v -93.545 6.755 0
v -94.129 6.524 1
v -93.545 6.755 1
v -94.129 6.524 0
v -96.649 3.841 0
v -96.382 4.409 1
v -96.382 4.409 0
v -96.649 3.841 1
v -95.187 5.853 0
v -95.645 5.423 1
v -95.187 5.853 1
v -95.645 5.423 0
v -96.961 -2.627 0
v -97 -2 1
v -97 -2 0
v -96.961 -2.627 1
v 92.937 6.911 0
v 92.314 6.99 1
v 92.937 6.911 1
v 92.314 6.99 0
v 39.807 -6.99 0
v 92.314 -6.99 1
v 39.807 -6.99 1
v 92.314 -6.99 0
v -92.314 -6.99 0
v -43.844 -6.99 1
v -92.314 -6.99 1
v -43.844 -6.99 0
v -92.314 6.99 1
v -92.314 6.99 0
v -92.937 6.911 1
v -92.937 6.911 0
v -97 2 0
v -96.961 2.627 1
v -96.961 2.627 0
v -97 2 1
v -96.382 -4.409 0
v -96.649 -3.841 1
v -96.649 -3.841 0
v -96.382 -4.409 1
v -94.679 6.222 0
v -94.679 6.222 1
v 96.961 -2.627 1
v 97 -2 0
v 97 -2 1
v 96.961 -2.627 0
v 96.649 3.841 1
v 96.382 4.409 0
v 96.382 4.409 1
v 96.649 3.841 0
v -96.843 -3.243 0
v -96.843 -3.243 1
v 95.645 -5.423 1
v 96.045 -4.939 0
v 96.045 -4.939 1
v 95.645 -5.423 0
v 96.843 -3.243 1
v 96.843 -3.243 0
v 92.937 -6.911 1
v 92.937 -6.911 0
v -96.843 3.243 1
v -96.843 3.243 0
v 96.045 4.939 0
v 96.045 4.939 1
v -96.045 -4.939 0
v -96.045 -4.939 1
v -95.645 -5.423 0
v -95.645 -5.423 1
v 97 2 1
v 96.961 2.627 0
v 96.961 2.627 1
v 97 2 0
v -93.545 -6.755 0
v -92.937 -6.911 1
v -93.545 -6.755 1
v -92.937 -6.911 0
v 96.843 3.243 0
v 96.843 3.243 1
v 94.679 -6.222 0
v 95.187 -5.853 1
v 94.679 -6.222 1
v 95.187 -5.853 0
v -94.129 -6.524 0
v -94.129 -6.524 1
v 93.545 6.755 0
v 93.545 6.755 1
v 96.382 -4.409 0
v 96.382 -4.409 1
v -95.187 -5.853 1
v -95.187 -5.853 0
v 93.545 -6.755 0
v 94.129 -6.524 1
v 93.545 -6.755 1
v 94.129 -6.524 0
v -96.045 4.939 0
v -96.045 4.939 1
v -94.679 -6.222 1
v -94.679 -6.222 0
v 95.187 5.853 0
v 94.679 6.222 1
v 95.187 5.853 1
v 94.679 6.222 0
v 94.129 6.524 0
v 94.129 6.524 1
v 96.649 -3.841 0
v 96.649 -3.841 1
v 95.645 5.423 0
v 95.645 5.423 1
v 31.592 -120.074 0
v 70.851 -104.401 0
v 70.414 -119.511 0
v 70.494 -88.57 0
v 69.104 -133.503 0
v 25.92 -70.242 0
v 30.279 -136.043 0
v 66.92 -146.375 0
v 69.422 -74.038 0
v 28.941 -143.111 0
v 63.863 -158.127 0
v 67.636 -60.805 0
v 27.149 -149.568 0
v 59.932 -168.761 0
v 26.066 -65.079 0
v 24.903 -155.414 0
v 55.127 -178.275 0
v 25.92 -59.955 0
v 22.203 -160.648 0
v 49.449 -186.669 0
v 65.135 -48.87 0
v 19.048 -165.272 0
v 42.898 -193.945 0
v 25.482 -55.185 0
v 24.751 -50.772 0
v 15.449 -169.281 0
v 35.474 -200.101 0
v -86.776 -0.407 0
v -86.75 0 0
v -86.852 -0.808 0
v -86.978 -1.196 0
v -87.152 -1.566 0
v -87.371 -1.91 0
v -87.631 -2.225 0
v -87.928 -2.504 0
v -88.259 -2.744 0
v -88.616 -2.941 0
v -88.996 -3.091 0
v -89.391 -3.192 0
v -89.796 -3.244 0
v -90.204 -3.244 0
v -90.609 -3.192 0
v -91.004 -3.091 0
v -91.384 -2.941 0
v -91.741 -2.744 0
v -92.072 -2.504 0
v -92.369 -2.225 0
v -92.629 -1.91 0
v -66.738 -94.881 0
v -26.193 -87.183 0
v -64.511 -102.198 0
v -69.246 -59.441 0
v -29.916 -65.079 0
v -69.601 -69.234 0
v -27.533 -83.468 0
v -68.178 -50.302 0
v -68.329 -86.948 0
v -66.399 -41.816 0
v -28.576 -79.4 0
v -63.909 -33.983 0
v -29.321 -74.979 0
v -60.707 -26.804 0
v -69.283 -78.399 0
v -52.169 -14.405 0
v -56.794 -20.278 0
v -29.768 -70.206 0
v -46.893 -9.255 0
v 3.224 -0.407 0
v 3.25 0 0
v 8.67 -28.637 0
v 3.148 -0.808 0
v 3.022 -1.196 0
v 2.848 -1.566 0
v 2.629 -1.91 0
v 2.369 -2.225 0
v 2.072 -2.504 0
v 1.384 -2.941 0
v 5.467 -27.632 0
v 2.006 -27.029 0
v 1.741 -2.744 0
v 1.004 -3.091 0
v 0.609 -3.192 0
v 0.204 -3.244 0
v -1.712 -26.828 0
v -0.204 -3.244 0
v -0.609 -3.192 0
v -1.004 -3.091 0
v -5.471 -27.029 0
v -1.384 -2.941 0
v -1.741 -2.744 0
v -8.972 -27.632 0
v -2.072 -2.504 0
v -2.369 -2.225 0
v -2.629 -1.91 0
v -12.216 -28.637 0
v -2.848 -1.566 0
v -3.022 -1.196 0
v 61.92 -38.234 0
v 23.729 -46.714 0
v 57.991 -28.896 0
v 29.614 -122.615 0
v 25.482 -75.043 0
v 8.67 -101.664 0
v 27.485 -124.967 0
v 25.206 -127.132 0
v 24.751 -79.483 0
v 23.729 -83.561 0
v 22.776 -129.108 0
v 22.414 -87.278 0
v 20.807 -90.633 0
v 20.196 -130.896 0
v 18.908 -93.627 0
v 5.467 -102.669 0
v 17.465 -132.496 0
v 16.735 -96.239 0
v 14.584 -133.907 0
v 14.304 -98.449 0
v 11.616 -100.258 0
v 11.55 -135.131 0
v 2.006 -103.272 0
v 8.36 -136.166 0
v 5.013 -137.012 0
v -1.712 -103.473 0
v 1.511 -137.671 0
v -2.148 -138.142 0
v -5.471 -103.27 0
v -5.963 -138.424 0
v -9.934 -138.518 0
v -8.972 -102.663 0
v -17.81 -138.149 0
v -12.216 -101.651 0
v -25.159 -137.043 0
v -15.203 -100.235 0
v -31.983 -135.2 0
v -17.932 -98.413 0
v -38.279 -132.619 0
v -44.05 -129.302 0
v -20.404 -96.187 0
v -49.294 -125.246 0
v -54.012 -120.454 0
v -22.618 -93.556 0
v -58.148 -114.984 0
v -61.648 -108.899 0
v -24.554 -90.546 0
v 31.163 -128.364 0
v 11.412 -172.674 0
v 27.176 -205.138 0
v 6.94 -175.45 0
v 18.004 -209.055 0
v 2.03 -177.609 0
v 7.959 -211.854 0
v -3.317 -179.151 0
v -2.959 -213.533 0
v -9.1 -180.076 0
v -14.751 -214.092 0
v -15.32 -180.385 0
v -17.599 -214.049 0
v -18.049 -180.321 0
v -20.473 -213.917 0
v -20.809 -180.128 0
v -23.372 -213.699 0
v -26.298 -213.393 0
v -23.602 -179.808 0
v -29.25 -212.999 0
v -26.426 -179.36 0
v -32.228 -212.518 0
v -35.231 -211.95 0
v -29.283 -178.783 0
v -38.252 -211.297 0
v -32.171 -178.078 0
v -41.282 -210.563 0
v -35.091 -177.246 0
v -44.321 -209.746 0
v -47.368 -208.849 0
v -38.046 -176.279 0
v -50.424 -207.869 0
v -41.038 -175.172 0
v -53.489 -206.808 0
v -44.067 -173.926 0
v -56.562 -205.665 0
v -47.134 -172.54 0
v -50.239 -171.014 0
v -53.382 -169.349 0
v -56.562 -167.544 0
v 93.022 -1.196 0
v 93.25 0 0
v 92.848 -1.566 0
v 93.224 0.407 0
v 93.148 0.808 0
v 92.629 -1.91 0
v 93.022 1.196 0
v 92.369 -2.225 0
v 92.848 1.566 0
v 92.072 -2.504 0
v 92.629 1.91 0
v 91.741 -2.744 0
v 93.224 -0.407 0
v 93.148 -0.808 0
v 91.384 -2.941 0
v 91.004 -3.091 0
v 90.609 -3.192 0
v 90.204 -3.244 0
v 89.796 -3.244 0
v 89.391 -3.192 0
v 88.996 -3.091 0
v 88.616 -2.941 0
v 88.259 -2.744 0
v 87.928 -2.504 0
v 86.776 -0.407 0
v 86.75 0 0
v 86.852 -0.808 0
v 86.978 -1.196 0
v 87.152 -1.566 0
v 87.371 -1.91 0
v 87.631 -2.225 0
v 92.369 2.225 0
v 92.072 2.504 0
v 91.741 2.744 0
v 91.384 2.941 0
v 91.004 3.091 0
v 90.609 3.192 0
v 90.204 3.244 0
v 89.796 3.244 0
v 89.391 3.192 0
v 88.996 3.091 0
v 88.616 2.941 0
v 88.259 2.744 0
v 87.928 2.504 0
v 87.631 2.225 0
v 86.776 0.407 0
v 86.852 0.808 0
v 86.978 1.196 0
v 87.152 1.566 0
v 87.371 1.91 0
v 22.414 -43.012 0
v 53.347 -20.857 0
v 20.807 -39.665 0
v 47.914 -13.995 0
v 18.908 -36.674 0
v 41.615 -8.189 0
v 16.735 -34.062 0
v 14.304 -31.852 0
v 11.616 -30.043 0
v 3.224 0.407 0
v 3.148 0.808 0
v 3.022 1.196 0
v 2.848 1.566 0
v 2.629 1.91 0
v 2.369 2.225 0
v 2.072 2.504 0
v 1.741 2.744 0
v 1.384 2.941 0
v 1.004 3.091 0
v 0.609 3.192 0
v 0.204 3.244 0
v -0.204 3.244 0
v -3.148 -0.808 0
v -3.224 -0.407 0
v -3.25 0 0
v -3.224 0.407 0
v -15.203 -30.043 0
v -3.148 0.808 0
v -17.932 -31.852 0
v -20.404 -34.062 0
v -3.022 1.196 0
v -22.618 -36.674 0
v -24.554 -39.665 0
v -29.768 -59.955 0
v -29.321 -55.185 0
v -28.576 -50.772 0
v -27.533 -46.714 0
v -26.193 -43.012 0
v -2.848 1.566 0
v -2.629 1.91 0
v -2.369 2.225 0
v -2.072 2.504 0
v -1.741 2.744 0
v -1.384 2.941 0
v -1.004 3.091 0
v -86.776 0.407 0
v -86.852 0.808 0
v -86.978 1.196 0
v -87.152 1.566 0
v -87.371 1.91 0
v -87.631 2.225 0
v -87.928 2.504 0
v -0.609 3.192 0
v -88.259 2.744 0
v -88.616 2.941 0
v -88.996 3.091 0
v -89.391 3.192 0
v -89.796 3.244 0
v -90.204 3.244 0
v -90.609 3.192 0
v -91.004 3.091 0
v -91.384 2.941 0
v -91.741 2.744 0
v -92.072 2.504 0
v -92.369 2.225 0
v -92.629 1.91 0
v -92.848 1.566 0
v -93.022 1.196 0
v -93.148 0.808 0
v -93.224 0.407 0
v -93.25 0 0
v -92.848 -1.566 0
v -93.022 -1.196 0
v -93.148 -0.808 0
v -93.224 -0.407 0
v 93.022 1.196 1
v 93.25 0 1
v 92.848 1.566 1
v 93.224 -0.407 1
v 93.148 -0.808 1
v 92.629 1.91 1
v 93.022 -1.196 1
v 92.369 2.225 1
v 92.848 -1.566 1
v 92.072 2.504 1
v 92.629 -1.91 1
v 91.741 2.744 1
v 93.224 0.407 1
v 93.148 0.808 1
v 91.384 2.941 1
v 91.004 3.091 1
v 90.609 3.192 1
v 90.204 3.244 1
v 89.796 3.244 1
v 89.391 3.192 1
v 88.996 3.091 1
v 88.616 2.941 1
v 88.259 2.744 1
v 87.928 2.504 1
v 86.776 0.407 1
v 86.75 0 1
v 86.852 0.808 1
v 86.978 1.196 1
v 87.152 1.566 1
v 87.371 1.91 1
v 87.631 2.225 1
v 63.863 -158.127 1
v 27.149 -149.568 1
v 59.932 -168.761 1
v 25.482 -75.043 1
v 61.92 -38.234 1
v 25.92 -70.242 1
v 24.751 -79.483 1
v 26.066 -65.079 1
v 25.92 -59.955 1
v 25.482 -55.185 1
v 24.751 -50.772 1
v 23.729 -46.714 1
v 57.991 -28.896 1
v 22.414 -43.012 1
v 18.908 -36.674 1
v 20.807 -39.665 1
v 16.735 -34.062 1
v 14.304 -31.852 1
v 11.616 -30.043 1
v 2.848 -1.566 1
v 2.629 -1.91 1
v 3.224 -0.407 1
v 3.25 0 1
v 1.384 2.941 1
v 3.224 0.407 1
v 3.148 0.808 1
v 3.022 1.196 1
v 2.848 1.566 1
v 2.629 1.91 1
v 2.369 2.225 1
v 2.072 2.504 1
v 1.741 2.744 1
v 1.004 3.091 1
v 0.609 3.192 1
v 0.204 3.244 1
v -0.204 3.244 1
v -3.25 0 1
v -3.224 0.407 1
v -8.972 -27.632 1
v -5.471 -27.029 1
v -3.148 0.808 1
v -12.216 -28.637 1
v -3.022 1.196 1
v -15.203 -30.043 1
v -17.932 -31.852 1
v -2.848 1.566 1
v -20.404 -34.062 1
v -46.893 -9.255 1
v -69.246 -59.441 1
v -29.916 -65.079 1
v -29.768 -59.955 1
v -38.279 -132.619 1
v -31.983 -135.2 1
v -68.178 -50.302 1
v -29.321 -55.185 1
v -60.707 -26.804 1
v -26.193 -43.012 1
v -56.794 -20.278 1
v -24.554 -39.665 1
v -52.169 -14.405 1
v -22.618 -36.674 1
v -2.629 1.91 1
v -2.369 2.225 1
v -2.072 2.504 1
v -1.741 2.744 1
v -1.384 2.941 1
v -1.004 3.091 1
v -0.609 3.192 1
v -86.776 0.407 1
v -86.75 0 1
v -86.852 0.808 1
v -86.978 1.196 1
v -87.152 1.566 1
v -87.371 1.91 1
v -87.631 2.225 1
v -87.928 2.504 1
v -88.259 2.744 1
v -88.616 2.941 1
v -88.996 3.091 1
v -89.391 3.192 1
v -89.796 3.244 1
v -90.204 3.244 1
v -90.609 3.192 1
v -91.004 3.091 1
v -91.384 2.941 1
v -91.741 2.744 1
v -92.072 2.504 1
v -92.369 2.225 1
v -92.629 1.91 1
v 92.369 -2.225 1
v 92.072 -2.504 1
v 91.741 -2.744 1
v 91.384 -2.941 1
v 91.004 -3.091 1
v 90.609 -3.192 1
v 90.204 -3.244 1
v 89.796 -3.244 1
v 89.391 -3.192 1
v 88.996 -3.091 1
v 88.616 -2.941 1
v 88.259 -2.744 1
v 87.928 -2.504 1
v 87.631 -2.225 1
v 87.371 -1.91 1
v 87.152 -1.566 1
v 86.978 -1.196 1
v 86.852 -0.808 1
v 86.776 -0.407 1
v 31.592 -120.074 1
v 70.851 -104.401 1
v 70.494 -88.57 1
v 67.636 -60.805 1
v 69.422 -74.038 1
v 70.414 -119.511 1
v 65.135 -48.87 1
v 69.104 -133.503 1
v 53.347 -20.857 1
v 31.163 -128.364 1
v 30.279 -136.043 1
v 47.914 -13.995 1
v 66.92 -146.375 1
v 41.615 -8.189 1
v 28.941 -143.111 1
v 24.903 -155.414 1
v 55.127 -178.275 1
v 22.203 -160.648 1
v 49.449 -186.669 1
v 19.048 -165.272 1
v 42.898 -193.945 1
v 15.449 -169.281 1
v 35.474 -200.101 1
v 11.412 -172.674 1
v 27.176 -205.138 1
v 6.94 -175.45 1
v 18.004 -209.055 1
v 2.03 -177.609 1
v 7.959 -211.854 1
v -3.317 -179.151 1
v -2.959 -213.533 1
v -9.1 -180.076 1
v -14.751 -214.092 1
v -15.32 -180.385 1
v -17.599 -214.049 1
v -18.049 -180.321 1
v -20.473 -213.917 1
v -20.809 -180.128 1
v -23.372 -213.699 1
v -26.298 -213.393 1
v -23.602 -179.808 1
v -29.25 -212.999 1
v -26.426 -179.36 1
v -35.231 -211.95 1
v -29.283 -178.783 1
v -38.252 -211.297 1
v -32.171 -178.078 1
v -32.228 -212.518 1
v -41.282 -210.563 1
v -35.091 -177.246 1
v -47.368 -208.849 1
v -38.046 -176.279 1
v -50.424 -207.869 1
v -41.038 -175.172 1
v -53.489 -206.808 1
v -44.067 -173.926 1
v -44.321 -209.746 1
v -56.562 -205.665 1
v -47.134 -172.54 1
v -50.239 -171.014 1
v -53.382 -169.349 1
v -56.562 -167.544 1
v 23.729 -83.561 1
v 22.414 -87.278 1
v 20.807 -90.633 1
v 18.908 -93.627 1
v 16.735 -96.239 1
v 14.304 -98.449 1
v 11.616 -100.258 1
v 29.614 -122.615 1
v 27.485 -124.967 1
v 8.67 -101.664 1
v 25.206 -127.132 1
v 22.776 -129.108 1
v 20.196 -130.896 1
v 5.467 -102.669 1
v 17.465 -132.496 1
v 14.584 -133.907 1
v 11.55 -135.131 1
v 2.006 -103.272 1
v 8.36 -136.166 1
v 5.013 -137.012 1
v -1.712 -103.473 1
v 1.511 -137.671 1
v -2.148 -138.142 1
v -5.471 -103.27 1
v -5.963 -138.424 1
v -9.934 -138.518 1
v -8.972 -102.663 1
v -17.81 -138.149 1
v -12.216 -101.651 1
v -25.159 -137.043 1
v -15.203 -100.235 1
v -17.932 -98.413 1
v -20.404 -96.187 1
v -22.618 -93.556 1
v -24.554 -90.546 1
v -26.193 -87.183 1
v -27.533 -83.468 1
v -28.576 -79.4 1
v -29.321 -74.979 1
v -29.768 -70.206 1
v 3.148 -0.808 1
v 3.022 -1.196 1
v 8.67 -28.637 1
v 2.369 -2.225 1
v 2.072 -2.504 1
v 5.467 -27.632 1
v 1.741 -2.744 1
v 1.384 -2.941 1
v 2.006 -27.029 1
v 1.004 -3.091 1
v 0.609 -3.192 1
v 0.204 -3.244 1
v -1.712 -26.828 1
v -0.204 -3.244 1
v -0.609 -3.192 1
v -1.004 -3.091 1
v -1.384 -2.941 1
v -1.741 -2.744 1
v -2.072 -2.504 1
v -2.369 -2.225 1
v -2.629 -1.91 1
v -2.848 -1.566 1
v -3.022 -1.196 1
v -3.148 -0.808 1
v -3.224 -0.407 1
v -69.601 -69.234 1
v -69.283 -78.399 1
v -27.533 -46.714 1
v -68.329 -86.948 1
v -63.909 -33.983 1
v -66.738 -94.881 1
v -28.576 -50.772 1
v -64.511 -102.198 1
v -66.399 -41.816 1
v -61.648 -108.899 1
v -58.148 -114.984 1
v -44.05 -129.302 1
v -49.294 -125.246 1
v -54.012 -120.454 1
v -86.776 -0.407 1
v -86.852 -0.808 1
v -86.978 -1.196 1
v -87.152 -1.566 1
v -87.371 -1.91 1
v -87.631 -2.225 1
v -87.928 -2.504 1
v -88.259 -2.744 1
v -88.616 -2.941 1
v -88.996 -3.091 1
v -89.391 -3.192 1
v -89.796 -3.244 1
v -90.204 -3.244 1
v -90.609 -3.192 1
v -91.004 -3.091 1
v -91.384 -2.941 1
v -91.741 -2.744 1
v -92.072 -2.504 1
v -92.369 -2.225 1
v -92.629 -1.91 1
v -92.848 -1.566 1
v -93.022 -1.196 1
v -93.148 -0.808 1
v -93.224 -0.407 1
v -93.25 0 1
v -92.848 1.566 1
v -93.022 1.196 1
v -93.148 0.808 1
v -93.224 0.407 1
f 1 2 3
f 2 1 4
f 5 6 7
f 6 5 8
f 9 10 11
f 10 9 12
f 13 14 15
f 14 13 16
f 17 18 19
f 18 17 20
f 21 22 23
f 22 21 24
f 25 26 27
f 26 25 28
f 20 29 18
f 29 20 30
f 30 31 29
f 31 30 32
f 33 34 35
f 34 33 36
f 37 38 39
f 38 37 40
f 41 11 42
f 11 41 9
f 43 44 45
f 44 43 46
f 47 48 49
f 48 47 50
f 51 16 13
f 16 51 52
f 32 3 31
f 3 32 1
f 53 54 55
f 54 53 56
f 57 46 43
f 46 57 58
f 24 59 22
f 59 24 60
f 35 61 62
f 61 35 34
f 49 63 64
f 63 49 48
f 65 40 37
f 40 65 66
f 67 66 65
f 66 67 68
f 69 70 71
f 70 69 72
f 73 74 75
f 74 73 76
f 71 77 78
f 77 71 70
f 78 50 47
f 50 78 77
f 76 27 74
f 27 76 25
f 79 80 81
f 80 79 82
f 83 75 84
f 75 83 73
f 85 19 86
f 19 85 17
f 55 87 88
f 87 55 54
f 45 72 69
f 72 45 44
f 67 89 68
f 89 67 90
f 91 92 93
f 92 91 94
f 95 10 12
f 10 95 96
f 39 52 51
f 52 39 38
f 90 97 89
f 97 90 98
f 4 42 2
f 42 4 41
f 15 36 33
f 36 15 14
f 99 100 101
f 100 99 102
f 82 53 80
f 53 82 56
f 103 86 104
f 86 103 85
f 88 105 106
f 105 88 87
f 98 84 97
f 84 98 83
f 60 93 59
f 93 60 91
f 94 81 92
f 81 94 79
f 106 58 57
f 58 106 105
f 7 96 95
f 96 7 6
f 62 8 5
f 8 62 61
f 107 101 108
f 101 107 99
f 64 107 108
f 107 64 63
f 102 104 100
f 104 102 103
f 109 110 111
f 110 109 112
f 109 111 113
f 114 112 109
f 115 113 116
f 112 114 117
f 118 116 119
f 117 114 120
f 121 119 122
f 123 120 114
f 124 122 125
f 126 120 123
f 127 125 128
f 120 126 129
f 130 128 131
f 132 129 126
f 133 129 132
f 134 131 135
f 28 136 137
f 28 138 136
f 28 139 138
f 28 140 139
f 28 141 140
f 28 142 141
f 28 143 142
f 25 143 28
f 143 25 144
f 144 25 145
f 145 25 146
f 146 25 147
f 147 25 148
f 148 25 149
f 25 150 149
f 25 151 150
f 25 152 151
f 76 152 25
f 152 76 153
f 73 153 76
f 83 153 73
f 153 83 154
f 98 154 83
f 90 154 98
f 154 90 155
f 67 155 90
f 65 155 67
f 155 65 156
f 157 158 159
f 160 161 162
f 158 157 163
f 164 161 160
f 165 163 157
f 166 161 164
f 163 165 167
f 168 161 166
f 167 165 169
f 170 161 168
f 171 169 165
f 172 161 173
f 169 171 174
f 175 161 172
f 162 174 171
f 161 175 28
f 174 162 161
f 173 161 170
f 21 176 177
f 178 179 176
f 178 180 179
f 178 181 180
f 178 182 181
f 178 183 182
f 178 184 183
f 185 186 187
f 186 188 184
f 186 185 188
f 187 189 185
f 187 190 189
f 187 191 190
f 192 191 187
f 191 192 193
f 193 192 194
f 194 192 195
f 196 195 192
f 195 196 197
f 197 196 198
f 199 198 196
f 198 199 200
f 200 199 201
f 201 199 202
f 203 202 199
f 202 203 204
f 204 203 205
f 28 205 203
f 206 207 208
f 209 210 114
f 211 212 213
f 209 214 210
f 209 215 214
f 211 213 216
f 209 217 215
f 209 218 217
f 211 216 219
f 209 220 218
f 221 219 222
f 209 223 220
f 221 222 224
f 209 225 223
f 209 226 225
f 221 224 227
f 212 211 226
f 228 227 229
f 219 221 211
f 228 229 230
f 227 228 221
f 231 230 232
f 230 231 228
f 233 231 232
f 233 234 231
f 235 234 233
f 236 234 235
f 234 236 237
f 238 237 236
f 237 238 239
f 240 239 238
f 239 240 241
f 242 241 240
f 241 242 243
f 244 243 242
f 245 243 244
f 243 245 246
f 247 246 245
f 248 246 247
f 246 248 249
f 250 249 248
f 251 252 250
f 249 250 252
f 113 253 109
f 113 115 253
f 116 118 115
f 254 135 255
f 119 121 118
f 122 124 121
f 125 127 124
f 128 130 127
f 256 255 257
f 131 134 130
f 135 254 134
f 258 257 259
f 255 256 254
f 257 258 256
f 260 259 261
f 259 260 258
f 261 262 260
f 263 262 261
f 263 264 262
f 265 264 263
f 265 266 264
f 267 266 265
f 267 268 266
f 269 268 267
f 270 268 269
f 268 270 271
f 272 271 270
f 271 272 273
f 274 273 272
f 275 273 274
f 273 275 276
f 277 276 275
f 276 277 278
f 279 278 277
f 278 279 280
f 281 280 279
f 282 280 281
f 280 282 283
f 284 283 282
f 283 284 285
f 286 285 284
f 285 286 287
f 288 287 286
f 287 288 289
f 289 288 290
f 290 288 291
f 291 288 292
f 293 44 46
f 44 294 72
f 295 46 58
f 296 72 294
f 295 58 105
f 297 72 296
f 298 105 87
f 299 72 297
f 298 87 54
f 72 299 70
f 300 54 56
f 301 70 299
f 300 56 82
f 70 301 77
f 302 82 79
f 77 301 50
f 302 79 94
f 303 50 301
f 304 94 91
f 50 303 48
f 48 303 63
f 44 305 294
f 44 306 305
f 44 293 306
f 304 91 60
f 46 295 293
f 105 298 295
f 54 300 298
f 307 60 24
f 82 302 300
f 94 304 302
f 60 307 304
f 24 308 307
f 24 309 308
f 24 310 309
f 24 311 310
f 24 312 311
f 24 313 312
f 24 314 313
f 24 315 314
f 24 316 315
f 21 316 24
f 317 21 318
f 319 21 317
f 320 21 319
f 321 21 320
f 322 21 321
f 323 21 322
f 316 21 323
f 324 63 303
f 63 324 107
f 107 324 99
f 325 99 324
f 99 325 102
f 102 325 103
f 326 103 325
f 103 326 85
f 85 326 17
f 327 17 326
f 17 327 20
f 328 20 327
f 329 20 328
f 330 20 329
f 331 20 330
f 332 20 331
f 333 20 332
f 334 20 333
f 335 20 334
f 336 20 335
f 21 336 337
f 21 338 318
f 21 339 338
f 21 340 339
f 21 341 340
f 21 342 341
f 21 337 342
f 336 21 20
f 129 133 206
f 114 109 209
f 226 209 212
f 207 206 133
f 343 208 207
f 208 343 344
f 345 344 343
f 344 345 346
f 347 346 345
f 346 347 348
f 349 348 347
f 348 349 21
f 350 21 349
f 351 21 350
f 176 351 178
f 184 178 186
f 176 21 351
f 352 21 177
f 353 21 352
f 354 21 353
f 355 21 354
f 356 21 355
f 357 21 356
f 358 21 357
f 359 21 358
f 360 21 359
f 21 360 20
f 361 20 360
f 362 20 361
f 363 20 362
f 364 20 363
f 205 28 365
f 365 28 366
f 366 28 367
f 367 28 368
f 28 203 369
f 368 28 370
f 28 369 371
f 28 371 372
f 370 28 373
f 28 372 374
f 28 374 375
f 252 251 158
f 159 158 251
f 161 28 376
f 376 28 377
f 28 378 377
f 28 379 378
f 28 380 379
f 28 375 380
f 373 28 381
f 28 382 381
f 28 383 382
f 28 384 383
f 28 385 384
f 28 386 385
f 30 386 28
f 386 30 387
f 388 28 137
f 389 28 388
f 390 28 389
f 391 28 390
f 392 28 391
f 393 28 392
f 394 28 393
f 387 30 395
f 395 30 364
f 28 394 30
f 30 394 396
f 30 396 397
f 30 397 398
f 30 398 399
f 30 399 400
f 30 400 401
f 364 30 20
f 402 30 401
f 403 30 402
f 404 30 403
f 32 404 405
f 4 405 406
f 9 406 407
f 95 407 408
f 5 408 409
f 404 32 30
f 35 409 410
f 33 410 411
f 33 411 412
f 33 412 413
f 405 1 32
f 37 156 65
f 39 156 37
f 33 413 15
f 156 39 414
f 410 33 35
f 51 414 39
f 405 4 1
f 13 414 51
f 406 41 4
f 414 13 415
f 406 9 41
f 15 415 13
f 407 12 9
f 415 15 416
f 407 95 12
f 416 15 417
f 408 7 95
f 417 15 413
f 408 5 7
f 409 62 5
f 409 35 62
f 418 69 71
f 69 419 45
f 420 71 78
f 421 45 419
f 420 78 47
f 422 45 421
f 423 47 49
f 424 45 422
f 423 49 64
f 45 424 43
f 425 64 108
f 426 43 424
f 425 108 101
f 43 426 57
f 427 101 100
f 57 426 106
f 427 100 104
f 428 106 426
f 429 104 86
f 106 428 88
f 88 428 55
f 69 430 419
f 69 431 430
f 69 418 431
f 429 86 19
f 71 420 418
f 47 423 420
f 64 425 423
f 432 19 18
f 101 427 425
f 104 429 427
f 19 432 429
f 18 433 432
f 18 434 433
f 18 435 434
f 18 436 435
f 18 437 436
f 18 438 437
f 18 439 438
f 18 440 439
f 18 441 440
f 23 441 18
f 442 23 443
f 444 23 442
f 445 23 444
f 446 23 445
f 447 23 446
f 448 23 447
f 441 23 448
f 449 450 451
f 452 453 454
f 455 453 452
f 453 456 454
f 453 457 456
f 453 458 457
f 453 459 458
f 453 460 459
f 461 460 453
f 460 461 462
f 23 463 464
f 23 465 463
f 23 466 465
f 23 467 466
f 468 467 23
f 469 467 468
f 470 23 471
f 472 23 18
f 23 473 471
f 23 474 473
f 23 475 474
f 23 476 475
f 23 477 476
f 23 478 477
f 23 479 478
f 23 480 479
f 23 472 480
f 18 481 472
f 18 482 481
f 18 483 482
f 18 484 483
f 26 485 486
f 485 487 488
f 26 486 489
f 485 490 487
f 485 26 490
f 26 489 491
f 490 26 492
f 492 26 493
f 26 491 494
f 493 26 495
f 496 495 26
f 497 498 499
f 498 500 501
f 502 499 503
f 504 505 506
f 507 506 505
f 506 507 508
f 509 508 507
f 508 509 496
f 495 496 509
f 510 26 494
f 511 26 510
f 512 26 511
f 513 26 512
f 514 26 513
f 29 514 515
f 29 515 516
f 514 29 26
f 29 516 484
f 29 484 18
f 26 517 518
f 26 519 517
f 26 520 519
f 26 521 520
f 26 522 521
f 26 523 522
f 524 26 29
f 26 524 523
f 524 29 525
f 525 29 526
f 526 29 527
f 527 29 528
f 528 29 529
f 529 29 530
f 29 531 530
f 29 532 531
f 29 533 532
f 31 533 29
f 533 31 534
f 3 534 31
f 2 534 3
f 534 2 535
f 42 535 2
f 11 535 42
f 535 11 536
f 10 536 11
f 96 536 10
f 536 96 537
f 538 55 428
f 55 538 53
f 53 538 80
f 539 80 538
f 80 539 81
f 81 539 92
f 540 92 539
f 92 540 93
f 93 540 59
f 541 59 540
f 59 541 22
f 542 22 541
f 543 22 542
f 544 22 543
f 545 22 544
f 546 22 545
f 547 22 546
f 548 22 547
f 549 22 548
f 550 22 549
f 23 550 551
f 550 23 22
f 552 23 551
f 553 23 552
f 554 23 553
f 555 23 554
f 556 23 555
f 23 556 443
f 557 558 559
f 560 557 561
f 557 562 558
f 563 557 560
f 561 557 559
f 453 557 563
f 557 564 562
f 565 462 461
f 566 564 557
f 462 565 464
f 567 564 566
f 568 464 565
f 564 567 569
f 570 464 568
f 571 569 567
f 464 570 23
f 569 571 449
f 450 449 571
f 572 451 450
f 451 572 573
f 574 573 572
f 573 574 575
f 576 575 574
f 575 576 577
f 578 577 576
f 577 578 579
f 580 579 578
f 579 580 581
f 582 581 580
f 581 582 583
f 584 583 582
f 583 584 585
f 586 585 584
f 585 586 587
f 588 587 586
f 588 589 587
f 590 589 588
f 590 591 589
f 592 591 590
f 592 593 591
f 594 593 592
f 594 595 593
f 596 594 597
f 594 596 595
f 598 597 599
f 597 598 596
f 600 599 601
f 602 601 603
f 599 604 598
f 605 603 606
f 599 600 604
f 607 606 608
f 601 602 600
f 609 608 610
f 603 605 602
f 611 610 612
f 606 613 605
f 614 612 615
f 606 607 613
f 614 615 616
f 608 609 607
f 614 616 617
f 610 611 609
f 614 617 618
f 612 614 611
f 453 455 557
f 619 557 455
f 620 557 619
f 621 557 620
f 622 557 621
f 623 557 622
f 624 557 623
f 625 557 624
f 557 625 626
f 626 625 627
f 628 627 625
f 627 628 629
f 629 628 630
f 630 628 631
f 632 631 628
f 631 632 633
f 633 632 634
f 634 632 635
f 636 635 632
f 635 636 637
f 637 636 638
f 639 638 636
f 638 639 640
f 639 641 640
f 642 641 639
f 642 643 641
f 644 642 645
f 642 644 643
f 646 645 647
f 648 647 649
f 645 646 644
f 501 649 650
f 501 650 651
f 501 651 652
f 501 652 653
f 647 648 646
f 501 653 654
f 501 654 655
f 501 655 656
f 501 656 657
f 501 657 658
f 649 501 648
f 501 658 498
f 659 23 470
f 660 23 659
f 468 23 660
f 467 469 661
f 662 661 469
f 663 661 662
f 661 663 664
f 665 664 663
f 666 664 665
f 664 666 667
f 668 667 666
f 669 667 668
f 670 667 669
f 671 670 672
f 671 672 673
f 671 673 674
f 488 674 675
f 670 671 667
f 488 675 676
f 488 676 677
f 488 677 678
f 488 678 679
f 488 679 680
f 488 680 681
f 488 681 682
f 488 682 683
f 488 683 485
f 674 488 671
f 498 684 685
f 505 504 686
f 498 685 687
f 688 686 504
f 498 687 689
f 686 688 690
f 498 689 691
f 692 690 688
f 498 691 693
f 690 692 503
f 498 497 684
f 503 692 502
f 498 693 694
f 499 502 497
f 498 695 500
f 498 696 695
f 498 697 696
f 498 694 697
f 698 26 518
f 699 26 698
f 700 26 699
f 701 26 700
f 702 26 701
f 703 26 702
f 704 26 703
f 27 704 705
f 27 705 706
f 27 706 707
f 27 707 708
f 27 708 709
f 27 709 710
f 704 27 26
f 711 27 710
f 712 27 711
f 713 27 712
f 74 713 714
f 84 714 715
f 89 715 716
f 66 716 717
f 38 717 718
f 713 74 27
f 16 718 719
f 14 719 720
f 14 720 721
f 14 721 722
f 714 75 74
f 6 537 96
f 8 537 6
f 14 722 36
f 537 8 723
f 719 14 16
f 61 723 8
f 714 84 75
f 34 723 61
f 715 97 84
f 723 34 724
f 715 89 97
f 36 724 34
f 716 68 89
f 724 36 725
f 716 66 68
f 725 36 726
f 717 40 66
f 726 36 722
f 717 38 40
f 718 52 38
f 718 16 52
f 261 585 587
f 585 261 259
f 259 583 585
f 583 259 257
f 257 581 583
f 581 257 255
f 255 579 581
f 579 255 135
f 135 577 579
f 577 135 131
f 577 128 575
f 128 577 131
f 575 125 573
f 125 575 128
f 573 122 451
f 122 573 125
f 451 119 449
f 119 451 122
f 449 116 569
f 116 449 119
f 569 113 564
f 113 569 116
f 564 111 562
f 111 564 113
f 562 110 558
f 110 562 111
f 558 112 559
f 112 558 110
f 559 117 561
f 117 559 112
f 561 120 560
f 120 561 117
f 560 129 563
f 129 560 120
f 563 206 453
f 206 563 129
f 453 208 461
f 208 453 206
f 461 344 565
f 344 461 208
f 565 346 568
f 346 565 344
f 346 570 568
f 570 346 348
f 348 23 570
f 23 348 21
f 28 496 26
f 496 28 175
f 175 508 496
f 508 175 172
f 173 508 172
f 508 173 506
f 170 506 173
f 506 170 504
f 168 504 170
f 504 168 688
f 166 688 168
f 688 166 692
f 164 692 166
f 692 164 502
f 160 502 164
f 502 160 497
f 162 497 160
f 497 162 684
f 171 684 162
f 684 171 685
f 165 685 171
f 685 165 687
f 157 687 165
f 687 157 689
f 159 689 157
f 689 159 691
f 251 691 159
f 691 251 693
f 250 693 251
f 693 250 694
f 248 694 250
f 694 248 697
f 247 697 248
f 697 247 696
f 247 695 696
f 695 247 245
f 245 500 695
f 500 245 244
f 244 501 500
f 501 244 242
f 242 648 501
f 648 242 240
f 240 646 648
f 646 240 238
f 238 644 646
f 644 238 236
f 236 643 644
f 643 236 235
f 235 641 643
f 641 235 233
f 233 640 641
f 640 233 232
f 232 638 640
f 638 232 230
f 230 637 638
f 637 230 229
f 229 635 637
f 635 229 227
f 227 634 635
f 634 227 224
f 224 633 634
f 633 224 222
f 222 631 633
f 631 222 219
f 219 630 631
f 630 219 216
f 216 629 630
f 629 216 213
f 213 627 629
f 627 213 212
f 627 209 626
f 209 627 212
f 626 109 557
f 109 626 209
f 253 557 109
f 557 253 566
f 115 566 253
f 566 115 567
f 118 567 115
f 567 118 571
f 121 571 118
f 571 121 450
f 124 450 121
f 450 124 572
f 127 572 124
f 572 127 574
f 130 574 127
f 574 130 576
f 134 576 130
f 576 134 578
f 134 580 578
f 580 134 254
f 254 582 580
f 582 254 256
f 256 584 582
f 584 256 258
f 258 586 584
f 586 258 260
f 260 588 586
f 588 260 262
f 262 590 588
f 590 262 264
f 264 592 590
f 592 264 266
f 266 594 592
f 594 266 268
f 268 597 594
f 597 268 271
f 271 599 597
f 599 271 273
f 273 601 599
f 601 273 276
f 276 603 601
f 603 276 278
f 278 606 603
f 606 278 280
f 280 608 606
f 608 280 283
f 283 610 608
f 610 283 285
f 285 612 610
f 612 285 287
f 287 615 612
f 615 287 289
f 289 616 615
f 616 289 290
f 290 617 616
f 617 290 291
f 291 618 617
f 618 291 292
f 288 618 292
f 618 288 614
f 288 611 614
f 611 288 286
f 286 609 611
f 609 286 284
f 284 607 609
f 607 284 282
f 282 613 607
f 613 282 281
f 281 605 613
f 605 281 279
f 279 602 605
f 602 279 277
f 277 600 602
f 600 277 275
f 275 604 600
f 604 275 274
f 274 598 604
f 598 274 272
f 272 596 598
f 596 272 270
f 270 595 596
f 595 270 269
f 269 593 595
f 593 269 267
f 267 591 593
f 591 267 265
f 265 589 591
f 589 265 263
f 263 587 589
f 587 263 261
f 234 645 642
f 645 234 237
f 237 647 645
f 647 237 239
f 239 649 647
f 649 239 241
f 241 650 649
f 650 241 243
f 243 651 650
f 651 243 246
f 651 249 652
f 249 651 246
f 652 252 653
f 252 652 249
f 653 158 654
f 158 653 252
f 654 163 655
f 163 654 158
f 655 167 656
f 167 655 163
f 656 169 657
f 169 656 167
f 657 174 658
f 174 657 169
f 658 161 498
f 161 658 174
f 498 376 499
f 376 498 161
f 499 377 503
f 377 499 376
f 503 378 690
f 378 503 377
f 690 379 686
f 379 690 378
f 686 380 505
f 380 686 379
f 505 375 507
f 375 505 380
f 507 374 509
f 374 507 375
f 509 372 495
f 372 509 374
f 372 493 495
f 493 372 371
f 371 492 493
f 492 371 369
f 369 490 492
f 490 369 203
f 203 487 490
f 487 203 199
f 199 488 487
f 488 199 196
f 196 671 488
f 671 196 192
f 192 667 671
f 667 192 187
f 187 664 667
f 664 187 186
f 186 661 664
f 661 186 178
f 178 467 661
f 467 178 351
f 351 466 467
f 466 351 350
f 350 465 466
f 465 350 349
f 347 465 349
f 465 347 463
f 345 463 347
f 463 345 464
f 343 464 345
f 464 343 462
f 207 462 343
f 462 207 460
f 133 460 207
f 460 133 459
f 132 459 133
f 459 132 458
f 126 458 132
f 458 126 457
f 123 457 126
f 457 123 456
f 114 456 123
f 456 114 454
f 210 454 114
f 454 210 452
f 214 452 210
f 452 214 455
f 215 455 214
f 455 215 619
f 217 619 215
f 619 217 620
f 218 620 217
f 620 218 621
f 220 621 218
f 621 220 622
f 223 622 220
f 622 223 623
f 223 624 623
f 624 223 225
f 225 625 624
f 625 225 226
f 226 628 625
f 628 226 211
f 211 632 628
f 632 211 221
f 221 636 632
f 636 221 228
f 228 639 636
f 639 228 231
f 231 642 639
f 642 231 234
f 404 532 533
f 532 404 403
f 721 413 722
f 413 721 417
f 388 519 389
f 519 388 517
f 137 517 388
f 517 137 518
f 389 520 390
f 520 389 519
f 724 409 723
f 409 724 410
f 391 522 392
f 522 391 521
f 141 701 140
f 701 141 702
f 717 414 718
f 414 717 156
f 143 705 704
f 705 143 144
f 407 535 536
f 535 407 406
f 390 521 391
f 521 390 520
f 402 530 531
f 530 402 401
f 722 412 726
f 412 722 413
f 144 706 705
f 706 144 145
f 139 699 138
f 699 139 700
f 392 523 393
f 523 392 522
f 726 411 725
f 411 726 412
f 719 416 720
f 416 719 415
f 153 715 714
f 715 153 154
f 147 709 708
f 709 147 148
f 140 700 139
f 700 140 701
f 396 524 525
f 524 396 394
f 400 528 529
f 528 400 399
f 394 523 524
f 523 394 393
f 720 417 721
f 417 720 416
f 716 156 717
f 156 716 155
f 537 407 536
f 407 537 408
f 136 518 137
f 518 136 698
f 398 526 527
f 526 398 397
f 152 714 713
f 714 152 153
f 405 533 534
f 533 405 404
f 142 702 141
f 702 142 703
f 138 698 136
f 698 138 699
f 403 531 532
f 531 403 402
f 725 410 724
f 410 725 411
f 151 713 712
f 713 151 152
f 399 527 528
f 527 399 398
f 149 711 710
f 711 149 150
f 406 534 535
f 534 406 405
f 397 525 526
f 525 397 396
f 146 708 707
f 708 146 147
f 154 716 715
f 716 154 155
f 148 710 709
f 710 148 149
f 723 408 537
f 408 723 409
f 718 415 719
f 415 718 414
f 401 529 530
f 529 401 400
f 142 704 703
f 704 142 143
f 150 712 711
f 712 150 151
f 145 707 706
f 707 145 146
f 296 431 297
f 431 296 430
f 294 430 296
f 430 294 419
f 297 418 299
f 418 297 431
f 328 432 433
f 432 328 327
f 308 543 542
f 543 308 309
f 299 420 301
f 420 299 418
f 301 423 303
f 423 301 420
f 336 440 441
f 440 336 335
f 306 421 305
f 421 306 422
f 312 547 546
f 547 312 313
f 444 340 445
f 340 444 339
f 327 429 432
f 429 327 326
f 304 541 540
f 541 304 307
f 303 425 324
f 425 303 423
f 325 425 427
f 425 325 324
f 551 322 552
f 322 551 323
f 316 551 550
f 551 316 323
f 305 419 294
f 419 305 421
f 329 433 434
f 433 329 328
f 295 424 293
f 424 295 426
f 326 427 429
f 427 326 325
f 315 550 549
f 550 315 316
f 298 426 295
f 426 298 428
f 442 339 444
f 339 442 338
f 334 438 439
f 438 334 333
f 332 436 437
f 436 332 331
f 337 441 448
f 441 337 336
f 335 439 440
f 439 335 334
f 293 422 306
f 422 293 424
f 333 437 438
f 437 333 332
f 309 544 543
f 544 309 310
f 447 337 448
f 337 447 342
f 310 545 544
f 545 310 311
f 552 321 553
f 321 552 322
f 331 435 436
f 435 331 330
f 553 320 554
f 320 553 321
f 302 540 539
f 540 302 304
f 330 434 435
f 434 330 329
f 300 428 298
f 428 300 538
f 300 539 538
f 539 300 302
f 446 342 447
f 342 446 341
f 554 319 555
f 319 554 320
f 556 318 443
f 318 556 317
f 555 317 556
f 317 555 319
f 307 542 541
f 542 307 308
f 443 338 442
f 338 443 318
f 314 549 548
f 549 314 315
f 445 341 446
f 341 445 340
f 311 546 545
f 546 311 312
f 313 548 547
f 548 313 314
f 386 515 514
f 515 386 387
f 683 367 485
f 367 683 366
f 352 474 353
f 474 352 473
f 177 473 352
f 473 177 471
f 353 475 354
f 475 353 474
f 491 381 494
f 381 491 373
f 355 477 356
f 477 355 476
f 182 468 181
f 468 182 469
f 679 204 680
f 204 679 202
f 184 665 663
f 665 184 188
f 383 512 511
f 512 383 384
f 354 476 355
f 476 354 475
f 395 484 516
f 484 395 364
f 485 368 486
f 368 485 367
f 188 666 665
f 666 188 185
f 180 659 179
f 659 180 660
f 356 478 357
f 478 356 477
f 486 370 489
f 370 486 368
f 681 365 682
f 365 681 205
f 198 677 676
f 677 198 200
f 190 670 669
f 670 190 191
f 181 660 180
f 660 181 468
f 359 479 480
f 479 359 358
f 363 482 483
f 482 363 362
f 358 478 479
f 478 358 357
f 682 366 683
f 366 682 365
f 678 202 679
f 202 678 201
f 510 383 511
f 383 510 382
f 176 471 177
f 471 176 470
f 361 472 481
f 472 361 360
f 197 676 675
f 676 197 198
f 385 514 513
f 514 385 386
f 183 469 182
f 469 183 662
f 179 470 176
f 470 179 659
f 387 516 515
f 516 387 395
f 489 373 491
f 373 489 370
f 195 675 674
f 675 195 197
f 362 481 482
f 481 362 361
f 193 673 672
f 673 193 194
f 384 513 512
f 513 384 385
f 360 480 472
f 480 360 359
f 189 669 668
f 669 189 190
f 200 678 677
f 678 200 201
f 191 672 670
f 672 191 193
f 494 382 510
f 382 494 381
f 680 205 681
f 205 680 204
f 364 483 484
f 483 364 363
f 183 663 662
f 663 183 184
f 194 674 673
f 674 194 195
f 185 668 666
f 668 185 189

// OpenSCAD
$fn = 50;


difference() {
	union() {
		translate(v = [0, 0, 0]) {
			rotate(a = [0, 0, 0]) {
				hull() {
					translate(v = [-92.0000000000, 2.0000000000, 0]) {
						rotate(a = [0, 0, 0]) {
							translate(v = [0, 0, 0]) {
								rotate(a = [0, 0, 0]) {
									cylinder(h = 1, r = 5);
								}
							}
						}
					}
					translate(v = [92.0000000000, 2.0000000000, 0]) {
						rotate(a = [0, 0, 0]) {
							translate(v = [0, 0, 0]) {
								rotate(a = [0, 0, 0]) {
									cylinder(h = 1, r = 5);
								}
							}
						}
					}
					translate(v = [-92.0000000000, -2.0000000000, 0]) {
						rotate(a = [0, 0, 0]) {
							translate(v = [0, 0, 0]) {
								rotate(a = [0, 0, 0]) {
									cylinder(h = 1, r = 5);
								}
							}
						}
					}
					translate(v = [92.0000000000, -2.0000000000, 0]) {
						rotate(a = [0, 0, 0]) {
							translate(v = [0, 0, 0]) {
								rotate(a = [0, 0, 0]) {
									cylinder(h = 1, r = 5);
								}
							}
						}
					}
				}
			}
		}
		translate(v = [0, 0, 0]) {
			rotate(a = [0, 0, 0]) {
				linear_extrude(height = 1) {
					text(font = "DejaVu Sans Mono:style=Bold", halign = "center", size = 209.0000000000, text = "9", valign = "top");
				}
			}
		}
	}
	union() {
		translate(v = [-90.0000000000, 0.0000000000, -125.0000000000]) {
			rotate(a = [0, 0, 0]) {
				cylinder(h = 250, r = 3.2500000000);
			}
		}
		translate(v = [90.0000000000, 0.0000000000, -125.0000000000]) {
			rotate(a = [0, 0, 0]) {
				cylinder(h = 250, r = 3.2500000000);
			}
		}
		translate(v = [90.0000000000, 0.0000000000, -125.0000000000]) {
			rotate(a = [0, 0, 0]) {
				cylinder(h = 250, r = 3.2500000000);
			}
		}
		translate(v = [0, 0, -125.0000000000]) {
			rotate(a = [0, 0, 0]) {
				cylinder(h = 250, r = 3.2500000000);
			}
		}
	}
}
